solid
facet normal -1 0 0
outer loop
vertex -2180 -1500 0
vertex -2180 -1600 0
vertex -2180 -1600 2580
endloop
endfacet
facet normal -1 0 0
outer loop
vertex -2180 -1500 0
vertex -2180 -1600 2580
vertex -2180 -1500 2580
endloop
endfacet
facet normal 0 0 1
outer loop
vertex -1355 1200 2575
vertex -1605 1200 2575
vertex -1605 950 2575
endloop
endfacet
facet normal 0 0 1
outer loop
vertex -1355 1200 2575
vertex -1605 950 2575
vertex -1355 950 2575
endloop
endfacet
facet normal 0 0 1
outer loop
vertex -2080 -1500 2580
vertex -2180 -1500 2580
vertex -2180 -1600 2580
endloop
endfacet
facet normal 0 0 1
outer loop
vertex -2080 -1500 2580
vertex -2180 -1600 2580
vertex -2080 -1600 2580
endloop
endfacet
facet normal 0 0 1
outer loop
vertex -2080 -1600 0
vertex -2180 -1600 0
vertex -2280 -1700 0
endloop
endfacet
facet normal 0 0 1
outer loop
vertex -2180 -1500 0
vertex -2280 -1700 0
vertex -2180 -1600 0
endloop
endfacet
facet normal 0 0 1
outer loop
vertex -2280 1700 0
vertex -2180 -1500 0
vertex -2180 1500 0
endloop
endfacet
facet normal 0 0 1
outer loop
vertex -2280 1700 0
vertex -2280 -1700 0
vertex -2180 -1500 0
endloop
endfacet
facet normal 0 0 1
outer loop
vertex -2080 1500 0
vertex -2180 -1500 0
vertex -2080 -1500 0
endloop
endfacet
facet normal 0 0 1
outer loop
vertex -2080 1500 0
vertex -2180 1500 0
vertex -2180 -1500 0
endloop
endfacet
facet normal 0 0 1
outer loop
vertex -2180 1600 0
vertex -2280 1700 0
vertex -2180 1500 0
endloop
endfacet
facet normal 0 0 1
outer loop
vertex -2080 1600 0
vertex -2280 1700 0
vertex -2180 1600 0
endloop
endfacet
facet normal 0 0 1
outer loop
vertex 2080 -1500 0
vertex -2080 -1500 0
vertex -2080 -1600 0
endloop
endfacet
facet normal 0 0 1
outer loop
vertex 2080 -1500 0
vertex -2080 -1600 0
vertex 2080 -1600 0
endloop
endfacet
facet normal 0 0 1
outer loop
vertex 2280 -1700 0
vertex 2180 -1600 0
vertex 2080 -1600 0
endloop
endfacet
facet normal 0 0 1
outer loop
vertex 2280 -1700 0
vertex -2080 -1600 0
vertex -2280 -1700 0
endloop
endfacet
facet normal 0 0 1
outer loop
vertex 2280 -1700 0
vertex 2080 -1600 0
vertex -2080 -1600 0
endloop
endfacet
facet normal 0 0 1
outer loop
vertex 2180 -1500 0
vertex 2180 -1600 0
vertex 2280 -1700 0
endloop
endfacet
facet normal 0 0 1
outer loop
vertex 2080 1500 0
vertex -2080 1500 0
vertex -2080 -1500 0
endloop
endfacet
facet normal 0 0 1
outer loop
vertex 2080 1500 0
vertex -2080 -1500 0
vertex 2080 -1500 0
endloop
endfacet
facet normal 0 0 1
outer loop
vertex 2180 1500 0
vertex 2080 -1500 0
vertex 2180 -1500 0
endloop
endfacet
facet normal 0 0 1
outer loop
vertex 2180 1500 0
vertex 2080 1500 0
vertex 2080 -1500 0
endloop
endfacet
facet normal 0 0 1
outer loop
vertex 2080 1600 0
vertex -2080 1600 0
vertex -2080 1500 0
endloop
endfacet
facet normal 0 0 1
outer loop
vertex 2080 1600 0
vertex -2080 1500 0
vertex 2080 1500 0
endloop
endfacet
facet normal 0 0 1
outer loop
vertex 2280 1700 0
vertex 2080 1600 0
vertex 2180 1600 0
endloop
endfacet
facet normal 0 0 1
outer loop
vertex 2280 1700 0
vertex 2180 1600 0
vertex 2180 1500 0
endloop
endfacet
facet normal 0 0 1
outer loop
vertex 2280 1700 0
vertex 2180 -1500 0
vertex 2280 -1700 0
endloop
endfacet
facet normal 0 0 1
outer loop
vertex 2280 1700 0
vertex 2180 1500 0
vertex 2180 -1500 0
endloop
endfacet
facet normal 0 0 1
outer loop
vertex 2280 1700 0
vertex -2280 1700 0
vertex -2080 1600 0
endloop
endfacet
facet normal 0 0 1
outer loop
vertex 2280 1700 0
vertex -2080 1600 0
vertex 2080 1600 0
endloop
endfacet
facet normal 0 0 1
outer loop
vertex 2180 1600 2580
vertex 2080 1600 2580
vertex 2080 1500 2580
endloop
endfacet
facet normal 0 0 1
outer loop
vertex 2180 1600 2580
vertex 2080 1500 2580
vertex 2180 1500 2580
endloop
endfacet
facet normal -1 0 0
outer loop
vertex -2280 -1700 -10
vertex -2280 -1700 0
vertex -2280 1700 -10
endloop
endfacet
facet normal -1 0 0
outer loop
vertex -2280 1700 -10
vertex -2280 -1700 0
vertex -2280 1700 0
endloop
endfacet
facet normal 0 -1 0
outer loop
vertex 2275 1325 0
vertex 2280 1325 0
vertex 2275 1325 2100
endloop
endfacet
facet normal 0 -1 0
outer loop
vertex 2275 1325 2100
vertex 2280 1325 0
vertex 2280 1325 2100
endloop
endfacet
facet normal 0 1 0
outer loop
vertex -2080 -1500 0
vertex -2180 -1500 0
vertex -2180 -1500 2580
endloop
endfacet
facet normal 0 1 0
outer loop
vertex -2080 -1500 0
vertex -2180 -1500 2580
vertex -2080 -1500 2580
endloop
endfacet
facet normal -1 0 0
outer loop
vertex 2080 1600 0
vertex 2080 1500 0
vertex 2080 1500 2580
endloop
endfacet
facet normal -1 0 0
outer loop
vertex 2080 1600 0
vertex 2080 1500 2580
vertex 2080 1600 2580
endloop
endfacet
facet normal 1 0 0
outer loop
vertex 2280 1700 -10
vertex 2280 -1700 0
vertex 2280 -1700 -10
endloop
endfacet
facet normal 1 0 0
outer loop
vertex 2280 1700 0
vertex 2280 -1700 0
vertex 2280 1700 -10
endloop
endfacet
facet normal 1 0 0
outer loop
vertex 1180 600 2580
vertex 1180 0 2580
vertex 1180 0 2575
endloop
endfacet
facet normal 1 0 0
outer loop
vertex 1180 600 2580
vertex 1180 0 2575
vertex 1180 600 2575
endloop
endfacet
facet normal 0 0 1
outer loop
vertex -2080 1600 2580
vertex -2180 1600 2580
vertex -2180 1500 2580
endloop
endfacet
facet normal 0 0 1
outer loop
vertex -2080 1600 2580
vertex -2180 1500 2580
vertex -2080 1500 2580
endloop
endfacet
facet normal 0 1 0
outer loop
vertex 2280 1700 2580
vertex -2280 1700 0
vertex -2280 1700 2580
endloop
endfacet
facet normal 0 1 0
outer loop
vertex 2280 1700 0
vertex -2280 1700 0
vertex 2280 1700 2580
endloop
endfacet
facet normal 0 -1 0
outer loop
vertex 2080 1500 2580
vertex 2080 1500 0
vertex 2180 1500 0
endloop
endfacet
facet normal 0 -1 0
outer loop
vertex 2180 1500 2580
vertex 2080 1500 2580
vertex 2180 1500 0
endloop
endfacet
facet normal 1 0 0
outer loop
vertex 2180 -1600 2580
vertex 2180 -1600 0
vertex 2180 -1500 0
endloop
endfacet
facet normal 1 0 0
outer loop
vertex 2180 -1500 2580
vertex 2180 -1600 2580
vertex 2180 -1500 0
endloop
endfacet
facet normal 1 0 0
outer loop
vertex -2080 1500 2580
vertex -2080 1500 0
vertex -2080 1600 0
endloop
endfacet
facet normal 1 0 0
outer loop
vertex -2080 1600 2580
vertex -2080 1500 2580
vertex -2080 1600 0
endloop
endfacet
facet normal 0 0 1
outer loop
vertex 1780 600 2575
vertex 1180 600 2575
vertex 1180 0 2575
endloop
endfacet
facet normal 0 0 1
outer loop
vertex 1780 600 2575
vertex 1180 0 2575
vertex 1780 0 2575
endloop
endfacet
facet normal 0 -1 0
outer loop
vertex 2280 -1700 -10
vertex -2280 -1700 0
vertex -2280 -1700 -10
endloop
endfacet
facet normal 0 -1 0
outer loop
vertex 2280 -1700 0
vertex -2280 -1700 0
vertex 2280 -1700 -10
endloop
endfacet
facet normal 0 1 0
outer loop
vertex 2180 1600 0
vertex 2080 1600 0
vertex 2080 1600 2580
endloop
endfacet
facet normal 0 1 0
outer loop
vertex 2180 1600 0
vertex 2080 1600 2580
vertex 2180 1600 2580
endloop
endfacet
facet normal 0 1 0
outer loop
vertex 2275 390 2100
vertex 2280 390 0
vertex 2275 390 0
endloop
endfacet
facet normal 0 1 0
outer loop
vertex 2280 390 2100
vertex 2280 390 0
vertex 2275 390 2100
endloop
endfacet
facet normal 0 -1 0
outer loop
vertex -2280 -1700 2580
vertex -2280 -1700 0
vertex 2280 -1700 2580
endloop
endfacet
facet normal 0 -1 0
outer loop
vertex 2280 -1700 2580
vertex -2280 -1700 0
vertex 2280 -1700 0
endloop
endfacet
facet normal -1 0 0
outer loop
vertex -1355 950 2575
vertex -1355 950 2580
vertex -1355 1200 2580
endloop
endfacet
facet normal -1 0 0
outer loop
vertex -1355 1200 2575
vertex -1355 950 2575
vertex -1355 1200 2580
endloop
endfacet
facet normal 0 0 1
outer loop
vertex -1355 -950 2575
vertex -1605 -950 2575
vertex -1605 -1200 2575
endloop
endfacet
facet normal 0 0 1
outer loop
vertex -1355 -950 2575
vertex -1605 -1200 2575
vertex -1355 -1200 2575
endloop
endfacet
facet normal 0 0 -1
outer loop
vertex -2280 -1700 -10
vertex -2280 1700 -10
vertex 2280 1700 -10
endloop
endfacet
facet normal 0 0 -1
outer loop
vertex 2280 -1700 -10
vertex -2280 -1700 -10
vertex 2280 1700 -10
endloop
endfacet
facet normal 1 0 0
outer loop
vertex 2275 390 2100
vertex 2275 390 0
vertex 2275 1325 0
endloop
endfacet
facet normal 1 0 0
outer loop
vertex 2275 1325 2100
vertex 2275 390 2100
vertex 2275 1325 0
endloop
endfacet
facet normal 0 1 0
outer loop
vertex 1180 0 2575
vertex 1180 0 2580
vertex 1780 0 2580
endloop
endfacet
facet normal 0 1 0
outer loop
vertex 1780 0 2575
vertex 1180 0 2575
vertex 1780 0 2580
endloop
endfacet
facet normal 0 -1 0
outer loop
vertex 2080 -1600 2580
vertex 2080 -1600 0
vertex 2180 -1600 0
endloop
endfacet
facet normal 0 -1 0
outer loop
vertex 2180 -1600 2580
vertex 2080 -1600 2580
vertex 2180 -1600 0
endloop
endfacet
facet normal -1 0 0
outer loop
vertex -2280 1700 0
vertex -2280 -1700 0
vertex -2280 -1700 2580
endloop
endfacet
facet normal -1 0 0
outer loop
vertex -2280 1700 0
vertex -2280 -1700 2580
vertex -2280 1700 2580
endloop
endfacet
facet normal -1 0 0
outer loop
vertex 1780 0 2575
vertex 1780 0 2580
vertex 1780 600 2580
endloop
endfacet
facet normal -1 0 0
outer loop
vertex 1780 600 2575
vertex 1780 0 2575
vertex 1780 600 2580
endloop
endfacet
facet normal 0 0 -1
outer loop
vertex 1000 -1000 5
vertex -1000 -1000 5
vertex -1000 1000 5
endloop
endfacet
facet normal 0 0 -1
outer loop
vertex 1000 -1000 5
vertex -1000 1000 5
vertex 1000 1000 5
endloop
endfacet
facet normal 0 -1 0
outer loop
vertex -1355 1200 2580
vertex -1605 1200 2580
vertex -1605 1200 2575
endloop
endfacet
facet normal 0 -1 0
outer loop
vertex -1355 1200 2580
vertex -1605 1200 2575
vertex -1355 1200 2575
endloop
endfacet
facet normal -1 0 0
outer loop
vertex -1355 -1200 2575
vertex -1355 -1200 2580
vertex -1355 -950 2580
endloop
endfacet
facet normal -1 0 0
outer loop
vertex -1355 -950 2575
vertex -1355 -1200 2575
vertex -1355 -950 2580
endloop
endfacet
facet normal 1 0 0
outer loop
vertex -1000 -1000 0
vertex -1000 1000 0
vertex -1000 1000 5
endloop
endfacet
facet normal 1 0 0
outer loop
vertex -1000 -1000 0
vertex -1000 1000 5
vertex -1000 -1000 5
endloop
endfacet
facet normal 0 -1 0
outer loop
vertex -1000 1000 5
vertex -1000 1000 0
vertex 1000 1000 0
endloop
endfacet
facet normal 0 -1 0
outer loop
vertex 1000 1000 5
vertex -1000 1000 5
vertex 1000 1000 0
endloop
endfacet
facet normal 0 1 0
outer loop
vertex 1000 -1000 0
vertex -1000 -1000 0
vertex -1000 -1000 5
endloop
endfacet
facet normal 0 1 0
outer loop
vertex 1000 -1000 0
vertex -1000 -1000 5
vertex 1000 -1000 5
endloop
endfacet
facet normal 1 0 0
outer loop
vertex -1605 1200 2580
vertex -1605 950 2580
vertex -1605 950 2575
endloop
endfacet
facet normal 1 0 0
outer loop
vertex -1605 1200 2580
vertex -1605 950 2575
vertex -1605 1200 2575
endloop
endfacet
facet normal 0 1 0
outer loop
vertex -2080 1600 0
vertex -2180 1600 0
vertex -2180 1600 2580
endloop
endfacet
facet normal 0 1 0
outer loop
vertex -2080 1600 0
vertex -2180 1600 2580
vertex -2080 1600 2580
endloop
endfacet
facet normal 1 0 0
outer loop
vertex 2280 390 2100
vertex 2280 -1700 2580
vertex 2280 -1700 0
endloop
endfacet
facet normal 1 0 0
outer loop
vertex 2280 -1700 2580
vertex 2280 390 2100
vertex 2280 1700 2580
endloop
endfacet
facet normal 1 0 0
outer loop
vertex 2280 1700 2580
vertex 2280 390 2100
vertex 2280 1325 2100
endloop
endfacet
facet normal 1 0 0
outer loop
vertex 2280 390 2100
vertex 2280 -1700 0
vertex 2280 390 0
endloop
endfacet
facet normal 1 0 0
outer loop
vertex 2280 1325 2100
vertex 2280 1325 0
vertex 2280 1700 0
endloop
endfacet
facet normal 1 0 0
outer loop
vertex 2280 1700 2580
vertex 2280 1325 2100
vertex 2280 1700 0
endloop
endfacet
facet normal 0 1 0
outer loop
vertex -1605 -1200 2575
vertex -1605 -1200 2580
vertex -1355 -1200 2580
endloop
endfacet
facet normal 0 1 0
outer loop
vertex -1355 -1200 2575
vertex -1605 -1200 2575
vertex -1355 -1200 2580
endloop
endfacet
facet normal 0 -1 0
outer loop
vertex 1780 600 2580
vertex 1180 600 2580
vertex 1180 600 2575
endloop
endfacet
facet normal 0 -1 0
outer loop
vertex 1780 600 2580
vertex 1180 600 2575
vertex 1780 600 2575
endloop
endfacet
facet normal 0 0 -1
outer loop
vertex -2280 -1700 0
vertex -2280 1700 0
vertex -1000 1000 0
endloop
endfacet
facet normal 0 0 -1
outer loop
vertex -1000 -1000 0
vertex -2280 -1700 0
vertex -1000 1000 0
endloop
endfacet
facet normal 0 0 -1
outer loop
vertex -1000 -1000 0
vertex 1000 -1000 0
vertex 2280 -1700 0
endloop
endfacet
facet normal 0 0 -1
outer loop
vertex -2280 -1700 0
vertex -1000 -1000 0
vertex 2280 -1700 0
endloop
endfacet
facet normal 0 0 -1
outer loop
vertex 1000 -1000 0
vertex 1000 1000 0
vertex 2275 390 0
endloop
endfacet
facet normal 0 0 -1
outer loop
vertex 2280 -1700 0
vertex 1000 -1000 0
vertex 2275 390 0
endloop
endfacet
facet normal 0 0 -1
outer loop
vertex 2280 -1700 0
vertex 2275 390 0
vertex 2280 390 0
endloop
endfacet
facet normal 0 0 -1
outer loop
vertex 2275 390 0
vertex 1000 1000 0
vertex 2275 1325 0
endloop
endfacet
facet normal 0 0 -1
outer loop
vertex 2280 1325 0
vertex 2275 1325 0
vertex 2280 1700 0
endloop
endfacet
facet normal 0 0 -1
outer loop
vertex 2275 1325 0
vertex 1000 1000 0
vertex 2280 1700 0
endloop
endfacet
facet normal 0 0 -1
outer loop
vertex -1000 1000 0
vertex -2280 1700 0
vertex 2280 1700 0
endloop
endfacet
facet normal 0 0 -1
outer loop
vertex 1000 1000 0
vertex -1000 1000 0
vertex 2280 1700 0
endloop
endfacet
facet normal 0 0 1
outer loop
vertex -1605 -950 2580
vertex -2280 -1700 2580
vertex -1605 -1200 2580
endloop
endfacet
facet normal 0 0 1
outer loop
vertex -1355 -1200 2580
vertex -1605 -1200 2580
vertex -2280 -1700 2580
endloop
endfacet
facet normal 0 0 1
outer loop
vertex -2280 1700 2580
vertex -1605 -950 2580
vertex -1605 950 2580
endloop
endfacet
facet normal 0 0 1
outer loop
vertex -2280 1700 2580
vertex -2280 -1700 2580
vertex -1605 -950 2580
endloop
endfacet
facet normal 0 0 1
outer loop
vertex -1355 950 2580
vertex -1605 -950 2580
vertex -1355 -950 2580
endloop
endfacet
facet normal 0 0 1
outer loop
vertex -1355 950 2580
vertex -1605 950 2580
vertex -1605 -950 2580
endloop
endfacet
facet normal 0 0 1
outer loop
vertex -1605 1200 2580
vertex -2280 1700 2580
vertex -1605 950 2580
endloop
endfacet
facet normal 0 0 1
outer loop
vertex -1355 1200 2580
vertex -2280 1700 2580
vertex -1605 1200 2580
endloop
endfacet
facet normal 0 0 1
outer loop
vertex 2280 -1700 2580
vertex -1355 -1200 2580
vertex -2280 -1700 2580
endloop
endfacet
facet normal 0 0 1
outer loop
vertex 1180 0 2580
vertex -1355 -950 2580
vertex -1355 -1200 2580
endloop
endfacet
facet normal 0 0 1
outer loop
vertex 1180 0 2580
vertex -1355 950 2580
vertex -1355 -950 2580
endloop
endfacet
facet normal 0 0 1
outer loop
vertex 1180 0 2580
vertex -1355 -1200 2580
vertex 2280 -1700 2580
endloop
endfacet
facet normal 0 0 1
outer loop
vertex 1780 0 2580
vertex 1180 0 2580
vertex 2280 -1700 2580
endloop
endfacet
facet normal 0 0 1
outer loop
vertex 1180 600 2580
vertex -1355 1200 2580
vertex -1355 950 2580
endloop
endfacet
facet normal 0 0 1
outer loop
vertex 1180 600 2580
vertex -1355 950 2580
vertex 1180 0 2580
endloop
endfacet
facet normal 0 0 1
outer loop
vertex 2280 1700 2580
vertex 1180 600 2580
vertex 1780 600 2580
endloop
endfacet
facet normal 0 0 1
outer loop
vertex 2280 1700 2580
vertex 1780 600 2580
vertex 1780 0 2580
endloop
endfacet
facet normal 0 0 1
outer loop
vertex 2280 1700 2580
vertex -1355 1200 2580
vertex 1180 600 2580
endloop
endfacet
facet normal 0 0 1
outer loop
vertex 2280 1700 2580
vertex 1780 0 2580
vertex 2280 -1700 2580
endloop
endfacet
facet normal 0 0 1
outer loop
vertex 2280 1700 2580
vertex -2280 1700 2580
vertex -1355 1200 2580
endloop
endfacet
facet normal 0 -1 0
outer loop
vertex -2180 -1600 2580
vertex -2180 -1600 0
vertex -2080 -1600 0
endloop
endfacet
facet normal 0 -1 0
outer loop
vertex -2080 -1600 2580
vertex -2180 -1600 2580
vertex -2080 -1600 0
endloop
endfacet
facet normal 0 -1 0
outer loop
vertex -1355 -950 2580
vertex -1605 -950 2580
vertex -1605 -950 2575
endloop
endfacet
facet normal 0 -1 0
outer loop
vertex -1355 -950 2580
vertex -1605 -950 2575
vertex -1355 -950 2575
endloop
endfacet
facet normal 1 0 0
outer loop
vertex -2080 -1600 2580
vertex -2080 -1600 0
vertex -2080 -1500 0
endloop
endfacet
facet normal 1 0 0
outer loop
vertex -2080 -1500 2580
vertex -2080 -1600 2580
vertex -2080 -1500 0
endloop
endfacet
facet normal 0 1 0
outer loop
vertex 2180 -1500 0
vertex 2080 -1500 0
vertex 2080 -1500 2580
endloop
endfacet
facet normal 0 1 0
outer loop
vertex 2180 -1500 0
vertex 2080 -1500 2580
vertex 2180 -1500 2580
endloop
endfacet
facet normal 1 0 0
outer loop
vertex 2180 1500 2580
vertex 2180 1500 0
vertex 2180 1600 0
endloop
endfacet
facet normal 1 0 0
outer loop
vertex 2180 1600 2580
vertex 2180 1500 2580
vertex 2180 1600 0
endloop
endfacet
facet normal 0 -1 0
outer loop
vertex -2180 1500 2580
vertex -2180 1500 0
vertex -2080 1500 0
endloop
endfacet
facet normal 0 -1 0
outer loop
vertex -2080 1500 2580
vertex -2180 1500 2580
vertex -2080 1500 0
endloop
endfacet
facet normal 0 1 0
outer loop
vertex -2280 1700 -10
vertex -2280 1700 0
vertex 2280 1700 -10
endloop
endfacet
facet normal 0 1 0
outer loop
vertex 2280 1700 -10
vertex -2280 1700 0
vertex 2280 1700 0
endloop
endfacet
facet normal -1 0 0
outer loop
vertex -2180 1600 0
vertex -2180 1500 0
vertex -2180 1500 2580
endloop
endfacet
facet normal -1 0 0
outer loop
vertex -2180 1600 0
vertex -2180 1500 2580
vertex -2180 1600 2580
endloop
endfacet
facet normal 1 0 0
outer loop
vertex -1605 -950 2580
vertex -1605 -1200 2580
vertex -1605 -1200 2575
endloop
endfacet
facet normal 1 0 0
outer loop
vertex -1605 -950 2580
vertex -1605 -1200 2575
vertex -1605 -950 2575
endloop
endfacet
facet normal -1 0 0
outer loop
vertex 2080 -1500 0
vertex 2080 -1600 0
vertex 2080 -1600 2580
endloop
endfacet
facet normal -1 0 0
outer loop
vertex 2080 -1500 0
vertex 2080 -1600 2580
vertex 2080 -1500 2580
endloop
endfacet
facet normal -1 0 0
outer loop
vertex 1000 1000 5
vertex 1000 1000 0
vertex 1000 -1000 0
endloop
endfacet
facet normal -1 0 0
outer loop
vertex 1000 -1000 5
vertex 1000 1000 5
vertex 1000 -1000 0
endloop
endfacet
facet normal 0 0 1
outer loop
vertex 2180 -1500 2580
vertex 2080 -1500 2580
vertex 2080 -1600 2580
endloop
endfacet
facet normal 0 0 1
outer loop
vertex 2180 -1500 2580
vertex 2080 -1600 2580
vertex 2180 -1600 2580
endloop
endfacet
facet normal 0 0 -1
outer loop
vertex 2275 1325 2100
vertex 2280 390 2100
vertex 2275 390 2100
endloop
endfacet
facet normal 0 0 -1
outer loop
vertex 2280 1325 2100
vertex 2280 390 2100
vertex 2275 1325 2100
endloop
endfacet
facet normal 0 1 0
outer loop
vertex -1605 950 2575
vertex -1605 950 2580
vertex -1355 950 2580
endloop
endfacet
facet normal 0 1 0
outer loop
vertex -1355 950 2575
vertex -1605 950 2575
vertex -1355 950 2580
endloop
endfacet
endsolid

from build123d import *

# Parameters (mm, degrees)
SKETCH001_W     = 4560
SKETCH001_H     = 3400
PAD_DEPTH       = 2580
SKETCH_W        = 935
SKETCH_H        = 2100
POCKET_DEPTH    = 5
SKETCH004_W     = 2000
SKETCH004_H     = 1625
POCKET001_DEPTH = 5
SKETCH002_W     = 250
SKETCH002_H     = 250
SKETCH002_W_2   = 600
SKETCH002_H_2   = 600
POCKET002_DEPTH = 5
SKETCH007_W     = 2000
SKETCH007_H     = 2000
POCKET003_DEPTH = 5
SKETCH006_W     = 4560
SKETCH006_H     = 3400
PAD001_DEPTH    = 10
SKETCH005_W     = 100
SKETCH005_H     = 100
PAD002_DEPTH    = 2580


with BuildPart() as chamber:
    # Sketch001 → Pad (new body)
    with BuildSketch(Plane.XY):
        Rectangle(SKETCH001_W, SKETCH001_H)
    extrude(amount=PAD_DEPTH)

    # Sketch (on DatumPlane) → Pocket (cut)
    with BuildSketch(Plane.YZ.offset(2280)):
        with Locations((857.5, 1050)):
            Rectangle(SKETCH_W, SKETCH_H)
    extrude(amount=-POCKET_DEPTH, mode=Mode.SUBTRACT)

    # Sketch004 (on DatumPlane) → Pocket001 (cut)
    with BuildSketch(Plane.YZ.offset(-2280)):
        with Locations((0, 1612.5)):
            Rectangle(SKETCH004_W, SKETCH004_H)
    extrude(amount=-POCKET001_DEPTH, mode=Mode.SUBTRACT)

    # Sketch002 (on DatumPlane) → Pocket002 (cut)
    with BuildSketch(Plane.XY.offset(2580)):
        with Locations((-1480, 1075)):
            Rectangle(SKETCH002_W, SKETCH002_H)
        with Locations((-1480, -1075)):
            Rectangle(SKETCH002_W, SKETCH002_H)
        with Locations((1480, 300)):
            Rectangle(SKETCH002_W_2, SKETCH002_H_2)
    extrude(amount=-POCKET002_DEPTH, mode=Mode.SUBTRACT)

    # Sketch007 (on Face2 of Pocket002) → Pocket003 (cut)
    with BuildSketch(Plane(origin=(0, 0, 0), x_dir=(1, 0, 0), z_dir=(0, 0, -1))):
        Rectangle(SKETCH007_W, SKETCH007_H)
    extrude(amount=-POCKET003_DEPTH, mode=Mode.SUBTRACT)


with BuildPart() as body001:
    # Sketch006 → Pad001 (new body)
    with BuildSketch(Plane.XY):
        Rectangle(SKETCH006_W, SKETCH006_H)
    extrude(amount=-PAD001_DEPTH)

    # Sketch005 → Pad002 (join)
    with BuildSketch(Plane.XY):
        with Locations((-2130, 1550)):
            Rectangle(SKETCH005_W, SKETCH005_H)
        with Locations((2130, 1550)):
            Rectangle(SKETCH005_W, SKETCH005_H)
        with Locations((2130, -1550)):
            Rectangle(SKETCH005_W, SKETCH005_H)
        with Locations((-2130, -1550)):
            Rectangle(SKETCH005_W, SKETCH005_H)
    extrude(amount=PAD002_DEPTH)


solid = Compound([chamber.part, body001.part])
